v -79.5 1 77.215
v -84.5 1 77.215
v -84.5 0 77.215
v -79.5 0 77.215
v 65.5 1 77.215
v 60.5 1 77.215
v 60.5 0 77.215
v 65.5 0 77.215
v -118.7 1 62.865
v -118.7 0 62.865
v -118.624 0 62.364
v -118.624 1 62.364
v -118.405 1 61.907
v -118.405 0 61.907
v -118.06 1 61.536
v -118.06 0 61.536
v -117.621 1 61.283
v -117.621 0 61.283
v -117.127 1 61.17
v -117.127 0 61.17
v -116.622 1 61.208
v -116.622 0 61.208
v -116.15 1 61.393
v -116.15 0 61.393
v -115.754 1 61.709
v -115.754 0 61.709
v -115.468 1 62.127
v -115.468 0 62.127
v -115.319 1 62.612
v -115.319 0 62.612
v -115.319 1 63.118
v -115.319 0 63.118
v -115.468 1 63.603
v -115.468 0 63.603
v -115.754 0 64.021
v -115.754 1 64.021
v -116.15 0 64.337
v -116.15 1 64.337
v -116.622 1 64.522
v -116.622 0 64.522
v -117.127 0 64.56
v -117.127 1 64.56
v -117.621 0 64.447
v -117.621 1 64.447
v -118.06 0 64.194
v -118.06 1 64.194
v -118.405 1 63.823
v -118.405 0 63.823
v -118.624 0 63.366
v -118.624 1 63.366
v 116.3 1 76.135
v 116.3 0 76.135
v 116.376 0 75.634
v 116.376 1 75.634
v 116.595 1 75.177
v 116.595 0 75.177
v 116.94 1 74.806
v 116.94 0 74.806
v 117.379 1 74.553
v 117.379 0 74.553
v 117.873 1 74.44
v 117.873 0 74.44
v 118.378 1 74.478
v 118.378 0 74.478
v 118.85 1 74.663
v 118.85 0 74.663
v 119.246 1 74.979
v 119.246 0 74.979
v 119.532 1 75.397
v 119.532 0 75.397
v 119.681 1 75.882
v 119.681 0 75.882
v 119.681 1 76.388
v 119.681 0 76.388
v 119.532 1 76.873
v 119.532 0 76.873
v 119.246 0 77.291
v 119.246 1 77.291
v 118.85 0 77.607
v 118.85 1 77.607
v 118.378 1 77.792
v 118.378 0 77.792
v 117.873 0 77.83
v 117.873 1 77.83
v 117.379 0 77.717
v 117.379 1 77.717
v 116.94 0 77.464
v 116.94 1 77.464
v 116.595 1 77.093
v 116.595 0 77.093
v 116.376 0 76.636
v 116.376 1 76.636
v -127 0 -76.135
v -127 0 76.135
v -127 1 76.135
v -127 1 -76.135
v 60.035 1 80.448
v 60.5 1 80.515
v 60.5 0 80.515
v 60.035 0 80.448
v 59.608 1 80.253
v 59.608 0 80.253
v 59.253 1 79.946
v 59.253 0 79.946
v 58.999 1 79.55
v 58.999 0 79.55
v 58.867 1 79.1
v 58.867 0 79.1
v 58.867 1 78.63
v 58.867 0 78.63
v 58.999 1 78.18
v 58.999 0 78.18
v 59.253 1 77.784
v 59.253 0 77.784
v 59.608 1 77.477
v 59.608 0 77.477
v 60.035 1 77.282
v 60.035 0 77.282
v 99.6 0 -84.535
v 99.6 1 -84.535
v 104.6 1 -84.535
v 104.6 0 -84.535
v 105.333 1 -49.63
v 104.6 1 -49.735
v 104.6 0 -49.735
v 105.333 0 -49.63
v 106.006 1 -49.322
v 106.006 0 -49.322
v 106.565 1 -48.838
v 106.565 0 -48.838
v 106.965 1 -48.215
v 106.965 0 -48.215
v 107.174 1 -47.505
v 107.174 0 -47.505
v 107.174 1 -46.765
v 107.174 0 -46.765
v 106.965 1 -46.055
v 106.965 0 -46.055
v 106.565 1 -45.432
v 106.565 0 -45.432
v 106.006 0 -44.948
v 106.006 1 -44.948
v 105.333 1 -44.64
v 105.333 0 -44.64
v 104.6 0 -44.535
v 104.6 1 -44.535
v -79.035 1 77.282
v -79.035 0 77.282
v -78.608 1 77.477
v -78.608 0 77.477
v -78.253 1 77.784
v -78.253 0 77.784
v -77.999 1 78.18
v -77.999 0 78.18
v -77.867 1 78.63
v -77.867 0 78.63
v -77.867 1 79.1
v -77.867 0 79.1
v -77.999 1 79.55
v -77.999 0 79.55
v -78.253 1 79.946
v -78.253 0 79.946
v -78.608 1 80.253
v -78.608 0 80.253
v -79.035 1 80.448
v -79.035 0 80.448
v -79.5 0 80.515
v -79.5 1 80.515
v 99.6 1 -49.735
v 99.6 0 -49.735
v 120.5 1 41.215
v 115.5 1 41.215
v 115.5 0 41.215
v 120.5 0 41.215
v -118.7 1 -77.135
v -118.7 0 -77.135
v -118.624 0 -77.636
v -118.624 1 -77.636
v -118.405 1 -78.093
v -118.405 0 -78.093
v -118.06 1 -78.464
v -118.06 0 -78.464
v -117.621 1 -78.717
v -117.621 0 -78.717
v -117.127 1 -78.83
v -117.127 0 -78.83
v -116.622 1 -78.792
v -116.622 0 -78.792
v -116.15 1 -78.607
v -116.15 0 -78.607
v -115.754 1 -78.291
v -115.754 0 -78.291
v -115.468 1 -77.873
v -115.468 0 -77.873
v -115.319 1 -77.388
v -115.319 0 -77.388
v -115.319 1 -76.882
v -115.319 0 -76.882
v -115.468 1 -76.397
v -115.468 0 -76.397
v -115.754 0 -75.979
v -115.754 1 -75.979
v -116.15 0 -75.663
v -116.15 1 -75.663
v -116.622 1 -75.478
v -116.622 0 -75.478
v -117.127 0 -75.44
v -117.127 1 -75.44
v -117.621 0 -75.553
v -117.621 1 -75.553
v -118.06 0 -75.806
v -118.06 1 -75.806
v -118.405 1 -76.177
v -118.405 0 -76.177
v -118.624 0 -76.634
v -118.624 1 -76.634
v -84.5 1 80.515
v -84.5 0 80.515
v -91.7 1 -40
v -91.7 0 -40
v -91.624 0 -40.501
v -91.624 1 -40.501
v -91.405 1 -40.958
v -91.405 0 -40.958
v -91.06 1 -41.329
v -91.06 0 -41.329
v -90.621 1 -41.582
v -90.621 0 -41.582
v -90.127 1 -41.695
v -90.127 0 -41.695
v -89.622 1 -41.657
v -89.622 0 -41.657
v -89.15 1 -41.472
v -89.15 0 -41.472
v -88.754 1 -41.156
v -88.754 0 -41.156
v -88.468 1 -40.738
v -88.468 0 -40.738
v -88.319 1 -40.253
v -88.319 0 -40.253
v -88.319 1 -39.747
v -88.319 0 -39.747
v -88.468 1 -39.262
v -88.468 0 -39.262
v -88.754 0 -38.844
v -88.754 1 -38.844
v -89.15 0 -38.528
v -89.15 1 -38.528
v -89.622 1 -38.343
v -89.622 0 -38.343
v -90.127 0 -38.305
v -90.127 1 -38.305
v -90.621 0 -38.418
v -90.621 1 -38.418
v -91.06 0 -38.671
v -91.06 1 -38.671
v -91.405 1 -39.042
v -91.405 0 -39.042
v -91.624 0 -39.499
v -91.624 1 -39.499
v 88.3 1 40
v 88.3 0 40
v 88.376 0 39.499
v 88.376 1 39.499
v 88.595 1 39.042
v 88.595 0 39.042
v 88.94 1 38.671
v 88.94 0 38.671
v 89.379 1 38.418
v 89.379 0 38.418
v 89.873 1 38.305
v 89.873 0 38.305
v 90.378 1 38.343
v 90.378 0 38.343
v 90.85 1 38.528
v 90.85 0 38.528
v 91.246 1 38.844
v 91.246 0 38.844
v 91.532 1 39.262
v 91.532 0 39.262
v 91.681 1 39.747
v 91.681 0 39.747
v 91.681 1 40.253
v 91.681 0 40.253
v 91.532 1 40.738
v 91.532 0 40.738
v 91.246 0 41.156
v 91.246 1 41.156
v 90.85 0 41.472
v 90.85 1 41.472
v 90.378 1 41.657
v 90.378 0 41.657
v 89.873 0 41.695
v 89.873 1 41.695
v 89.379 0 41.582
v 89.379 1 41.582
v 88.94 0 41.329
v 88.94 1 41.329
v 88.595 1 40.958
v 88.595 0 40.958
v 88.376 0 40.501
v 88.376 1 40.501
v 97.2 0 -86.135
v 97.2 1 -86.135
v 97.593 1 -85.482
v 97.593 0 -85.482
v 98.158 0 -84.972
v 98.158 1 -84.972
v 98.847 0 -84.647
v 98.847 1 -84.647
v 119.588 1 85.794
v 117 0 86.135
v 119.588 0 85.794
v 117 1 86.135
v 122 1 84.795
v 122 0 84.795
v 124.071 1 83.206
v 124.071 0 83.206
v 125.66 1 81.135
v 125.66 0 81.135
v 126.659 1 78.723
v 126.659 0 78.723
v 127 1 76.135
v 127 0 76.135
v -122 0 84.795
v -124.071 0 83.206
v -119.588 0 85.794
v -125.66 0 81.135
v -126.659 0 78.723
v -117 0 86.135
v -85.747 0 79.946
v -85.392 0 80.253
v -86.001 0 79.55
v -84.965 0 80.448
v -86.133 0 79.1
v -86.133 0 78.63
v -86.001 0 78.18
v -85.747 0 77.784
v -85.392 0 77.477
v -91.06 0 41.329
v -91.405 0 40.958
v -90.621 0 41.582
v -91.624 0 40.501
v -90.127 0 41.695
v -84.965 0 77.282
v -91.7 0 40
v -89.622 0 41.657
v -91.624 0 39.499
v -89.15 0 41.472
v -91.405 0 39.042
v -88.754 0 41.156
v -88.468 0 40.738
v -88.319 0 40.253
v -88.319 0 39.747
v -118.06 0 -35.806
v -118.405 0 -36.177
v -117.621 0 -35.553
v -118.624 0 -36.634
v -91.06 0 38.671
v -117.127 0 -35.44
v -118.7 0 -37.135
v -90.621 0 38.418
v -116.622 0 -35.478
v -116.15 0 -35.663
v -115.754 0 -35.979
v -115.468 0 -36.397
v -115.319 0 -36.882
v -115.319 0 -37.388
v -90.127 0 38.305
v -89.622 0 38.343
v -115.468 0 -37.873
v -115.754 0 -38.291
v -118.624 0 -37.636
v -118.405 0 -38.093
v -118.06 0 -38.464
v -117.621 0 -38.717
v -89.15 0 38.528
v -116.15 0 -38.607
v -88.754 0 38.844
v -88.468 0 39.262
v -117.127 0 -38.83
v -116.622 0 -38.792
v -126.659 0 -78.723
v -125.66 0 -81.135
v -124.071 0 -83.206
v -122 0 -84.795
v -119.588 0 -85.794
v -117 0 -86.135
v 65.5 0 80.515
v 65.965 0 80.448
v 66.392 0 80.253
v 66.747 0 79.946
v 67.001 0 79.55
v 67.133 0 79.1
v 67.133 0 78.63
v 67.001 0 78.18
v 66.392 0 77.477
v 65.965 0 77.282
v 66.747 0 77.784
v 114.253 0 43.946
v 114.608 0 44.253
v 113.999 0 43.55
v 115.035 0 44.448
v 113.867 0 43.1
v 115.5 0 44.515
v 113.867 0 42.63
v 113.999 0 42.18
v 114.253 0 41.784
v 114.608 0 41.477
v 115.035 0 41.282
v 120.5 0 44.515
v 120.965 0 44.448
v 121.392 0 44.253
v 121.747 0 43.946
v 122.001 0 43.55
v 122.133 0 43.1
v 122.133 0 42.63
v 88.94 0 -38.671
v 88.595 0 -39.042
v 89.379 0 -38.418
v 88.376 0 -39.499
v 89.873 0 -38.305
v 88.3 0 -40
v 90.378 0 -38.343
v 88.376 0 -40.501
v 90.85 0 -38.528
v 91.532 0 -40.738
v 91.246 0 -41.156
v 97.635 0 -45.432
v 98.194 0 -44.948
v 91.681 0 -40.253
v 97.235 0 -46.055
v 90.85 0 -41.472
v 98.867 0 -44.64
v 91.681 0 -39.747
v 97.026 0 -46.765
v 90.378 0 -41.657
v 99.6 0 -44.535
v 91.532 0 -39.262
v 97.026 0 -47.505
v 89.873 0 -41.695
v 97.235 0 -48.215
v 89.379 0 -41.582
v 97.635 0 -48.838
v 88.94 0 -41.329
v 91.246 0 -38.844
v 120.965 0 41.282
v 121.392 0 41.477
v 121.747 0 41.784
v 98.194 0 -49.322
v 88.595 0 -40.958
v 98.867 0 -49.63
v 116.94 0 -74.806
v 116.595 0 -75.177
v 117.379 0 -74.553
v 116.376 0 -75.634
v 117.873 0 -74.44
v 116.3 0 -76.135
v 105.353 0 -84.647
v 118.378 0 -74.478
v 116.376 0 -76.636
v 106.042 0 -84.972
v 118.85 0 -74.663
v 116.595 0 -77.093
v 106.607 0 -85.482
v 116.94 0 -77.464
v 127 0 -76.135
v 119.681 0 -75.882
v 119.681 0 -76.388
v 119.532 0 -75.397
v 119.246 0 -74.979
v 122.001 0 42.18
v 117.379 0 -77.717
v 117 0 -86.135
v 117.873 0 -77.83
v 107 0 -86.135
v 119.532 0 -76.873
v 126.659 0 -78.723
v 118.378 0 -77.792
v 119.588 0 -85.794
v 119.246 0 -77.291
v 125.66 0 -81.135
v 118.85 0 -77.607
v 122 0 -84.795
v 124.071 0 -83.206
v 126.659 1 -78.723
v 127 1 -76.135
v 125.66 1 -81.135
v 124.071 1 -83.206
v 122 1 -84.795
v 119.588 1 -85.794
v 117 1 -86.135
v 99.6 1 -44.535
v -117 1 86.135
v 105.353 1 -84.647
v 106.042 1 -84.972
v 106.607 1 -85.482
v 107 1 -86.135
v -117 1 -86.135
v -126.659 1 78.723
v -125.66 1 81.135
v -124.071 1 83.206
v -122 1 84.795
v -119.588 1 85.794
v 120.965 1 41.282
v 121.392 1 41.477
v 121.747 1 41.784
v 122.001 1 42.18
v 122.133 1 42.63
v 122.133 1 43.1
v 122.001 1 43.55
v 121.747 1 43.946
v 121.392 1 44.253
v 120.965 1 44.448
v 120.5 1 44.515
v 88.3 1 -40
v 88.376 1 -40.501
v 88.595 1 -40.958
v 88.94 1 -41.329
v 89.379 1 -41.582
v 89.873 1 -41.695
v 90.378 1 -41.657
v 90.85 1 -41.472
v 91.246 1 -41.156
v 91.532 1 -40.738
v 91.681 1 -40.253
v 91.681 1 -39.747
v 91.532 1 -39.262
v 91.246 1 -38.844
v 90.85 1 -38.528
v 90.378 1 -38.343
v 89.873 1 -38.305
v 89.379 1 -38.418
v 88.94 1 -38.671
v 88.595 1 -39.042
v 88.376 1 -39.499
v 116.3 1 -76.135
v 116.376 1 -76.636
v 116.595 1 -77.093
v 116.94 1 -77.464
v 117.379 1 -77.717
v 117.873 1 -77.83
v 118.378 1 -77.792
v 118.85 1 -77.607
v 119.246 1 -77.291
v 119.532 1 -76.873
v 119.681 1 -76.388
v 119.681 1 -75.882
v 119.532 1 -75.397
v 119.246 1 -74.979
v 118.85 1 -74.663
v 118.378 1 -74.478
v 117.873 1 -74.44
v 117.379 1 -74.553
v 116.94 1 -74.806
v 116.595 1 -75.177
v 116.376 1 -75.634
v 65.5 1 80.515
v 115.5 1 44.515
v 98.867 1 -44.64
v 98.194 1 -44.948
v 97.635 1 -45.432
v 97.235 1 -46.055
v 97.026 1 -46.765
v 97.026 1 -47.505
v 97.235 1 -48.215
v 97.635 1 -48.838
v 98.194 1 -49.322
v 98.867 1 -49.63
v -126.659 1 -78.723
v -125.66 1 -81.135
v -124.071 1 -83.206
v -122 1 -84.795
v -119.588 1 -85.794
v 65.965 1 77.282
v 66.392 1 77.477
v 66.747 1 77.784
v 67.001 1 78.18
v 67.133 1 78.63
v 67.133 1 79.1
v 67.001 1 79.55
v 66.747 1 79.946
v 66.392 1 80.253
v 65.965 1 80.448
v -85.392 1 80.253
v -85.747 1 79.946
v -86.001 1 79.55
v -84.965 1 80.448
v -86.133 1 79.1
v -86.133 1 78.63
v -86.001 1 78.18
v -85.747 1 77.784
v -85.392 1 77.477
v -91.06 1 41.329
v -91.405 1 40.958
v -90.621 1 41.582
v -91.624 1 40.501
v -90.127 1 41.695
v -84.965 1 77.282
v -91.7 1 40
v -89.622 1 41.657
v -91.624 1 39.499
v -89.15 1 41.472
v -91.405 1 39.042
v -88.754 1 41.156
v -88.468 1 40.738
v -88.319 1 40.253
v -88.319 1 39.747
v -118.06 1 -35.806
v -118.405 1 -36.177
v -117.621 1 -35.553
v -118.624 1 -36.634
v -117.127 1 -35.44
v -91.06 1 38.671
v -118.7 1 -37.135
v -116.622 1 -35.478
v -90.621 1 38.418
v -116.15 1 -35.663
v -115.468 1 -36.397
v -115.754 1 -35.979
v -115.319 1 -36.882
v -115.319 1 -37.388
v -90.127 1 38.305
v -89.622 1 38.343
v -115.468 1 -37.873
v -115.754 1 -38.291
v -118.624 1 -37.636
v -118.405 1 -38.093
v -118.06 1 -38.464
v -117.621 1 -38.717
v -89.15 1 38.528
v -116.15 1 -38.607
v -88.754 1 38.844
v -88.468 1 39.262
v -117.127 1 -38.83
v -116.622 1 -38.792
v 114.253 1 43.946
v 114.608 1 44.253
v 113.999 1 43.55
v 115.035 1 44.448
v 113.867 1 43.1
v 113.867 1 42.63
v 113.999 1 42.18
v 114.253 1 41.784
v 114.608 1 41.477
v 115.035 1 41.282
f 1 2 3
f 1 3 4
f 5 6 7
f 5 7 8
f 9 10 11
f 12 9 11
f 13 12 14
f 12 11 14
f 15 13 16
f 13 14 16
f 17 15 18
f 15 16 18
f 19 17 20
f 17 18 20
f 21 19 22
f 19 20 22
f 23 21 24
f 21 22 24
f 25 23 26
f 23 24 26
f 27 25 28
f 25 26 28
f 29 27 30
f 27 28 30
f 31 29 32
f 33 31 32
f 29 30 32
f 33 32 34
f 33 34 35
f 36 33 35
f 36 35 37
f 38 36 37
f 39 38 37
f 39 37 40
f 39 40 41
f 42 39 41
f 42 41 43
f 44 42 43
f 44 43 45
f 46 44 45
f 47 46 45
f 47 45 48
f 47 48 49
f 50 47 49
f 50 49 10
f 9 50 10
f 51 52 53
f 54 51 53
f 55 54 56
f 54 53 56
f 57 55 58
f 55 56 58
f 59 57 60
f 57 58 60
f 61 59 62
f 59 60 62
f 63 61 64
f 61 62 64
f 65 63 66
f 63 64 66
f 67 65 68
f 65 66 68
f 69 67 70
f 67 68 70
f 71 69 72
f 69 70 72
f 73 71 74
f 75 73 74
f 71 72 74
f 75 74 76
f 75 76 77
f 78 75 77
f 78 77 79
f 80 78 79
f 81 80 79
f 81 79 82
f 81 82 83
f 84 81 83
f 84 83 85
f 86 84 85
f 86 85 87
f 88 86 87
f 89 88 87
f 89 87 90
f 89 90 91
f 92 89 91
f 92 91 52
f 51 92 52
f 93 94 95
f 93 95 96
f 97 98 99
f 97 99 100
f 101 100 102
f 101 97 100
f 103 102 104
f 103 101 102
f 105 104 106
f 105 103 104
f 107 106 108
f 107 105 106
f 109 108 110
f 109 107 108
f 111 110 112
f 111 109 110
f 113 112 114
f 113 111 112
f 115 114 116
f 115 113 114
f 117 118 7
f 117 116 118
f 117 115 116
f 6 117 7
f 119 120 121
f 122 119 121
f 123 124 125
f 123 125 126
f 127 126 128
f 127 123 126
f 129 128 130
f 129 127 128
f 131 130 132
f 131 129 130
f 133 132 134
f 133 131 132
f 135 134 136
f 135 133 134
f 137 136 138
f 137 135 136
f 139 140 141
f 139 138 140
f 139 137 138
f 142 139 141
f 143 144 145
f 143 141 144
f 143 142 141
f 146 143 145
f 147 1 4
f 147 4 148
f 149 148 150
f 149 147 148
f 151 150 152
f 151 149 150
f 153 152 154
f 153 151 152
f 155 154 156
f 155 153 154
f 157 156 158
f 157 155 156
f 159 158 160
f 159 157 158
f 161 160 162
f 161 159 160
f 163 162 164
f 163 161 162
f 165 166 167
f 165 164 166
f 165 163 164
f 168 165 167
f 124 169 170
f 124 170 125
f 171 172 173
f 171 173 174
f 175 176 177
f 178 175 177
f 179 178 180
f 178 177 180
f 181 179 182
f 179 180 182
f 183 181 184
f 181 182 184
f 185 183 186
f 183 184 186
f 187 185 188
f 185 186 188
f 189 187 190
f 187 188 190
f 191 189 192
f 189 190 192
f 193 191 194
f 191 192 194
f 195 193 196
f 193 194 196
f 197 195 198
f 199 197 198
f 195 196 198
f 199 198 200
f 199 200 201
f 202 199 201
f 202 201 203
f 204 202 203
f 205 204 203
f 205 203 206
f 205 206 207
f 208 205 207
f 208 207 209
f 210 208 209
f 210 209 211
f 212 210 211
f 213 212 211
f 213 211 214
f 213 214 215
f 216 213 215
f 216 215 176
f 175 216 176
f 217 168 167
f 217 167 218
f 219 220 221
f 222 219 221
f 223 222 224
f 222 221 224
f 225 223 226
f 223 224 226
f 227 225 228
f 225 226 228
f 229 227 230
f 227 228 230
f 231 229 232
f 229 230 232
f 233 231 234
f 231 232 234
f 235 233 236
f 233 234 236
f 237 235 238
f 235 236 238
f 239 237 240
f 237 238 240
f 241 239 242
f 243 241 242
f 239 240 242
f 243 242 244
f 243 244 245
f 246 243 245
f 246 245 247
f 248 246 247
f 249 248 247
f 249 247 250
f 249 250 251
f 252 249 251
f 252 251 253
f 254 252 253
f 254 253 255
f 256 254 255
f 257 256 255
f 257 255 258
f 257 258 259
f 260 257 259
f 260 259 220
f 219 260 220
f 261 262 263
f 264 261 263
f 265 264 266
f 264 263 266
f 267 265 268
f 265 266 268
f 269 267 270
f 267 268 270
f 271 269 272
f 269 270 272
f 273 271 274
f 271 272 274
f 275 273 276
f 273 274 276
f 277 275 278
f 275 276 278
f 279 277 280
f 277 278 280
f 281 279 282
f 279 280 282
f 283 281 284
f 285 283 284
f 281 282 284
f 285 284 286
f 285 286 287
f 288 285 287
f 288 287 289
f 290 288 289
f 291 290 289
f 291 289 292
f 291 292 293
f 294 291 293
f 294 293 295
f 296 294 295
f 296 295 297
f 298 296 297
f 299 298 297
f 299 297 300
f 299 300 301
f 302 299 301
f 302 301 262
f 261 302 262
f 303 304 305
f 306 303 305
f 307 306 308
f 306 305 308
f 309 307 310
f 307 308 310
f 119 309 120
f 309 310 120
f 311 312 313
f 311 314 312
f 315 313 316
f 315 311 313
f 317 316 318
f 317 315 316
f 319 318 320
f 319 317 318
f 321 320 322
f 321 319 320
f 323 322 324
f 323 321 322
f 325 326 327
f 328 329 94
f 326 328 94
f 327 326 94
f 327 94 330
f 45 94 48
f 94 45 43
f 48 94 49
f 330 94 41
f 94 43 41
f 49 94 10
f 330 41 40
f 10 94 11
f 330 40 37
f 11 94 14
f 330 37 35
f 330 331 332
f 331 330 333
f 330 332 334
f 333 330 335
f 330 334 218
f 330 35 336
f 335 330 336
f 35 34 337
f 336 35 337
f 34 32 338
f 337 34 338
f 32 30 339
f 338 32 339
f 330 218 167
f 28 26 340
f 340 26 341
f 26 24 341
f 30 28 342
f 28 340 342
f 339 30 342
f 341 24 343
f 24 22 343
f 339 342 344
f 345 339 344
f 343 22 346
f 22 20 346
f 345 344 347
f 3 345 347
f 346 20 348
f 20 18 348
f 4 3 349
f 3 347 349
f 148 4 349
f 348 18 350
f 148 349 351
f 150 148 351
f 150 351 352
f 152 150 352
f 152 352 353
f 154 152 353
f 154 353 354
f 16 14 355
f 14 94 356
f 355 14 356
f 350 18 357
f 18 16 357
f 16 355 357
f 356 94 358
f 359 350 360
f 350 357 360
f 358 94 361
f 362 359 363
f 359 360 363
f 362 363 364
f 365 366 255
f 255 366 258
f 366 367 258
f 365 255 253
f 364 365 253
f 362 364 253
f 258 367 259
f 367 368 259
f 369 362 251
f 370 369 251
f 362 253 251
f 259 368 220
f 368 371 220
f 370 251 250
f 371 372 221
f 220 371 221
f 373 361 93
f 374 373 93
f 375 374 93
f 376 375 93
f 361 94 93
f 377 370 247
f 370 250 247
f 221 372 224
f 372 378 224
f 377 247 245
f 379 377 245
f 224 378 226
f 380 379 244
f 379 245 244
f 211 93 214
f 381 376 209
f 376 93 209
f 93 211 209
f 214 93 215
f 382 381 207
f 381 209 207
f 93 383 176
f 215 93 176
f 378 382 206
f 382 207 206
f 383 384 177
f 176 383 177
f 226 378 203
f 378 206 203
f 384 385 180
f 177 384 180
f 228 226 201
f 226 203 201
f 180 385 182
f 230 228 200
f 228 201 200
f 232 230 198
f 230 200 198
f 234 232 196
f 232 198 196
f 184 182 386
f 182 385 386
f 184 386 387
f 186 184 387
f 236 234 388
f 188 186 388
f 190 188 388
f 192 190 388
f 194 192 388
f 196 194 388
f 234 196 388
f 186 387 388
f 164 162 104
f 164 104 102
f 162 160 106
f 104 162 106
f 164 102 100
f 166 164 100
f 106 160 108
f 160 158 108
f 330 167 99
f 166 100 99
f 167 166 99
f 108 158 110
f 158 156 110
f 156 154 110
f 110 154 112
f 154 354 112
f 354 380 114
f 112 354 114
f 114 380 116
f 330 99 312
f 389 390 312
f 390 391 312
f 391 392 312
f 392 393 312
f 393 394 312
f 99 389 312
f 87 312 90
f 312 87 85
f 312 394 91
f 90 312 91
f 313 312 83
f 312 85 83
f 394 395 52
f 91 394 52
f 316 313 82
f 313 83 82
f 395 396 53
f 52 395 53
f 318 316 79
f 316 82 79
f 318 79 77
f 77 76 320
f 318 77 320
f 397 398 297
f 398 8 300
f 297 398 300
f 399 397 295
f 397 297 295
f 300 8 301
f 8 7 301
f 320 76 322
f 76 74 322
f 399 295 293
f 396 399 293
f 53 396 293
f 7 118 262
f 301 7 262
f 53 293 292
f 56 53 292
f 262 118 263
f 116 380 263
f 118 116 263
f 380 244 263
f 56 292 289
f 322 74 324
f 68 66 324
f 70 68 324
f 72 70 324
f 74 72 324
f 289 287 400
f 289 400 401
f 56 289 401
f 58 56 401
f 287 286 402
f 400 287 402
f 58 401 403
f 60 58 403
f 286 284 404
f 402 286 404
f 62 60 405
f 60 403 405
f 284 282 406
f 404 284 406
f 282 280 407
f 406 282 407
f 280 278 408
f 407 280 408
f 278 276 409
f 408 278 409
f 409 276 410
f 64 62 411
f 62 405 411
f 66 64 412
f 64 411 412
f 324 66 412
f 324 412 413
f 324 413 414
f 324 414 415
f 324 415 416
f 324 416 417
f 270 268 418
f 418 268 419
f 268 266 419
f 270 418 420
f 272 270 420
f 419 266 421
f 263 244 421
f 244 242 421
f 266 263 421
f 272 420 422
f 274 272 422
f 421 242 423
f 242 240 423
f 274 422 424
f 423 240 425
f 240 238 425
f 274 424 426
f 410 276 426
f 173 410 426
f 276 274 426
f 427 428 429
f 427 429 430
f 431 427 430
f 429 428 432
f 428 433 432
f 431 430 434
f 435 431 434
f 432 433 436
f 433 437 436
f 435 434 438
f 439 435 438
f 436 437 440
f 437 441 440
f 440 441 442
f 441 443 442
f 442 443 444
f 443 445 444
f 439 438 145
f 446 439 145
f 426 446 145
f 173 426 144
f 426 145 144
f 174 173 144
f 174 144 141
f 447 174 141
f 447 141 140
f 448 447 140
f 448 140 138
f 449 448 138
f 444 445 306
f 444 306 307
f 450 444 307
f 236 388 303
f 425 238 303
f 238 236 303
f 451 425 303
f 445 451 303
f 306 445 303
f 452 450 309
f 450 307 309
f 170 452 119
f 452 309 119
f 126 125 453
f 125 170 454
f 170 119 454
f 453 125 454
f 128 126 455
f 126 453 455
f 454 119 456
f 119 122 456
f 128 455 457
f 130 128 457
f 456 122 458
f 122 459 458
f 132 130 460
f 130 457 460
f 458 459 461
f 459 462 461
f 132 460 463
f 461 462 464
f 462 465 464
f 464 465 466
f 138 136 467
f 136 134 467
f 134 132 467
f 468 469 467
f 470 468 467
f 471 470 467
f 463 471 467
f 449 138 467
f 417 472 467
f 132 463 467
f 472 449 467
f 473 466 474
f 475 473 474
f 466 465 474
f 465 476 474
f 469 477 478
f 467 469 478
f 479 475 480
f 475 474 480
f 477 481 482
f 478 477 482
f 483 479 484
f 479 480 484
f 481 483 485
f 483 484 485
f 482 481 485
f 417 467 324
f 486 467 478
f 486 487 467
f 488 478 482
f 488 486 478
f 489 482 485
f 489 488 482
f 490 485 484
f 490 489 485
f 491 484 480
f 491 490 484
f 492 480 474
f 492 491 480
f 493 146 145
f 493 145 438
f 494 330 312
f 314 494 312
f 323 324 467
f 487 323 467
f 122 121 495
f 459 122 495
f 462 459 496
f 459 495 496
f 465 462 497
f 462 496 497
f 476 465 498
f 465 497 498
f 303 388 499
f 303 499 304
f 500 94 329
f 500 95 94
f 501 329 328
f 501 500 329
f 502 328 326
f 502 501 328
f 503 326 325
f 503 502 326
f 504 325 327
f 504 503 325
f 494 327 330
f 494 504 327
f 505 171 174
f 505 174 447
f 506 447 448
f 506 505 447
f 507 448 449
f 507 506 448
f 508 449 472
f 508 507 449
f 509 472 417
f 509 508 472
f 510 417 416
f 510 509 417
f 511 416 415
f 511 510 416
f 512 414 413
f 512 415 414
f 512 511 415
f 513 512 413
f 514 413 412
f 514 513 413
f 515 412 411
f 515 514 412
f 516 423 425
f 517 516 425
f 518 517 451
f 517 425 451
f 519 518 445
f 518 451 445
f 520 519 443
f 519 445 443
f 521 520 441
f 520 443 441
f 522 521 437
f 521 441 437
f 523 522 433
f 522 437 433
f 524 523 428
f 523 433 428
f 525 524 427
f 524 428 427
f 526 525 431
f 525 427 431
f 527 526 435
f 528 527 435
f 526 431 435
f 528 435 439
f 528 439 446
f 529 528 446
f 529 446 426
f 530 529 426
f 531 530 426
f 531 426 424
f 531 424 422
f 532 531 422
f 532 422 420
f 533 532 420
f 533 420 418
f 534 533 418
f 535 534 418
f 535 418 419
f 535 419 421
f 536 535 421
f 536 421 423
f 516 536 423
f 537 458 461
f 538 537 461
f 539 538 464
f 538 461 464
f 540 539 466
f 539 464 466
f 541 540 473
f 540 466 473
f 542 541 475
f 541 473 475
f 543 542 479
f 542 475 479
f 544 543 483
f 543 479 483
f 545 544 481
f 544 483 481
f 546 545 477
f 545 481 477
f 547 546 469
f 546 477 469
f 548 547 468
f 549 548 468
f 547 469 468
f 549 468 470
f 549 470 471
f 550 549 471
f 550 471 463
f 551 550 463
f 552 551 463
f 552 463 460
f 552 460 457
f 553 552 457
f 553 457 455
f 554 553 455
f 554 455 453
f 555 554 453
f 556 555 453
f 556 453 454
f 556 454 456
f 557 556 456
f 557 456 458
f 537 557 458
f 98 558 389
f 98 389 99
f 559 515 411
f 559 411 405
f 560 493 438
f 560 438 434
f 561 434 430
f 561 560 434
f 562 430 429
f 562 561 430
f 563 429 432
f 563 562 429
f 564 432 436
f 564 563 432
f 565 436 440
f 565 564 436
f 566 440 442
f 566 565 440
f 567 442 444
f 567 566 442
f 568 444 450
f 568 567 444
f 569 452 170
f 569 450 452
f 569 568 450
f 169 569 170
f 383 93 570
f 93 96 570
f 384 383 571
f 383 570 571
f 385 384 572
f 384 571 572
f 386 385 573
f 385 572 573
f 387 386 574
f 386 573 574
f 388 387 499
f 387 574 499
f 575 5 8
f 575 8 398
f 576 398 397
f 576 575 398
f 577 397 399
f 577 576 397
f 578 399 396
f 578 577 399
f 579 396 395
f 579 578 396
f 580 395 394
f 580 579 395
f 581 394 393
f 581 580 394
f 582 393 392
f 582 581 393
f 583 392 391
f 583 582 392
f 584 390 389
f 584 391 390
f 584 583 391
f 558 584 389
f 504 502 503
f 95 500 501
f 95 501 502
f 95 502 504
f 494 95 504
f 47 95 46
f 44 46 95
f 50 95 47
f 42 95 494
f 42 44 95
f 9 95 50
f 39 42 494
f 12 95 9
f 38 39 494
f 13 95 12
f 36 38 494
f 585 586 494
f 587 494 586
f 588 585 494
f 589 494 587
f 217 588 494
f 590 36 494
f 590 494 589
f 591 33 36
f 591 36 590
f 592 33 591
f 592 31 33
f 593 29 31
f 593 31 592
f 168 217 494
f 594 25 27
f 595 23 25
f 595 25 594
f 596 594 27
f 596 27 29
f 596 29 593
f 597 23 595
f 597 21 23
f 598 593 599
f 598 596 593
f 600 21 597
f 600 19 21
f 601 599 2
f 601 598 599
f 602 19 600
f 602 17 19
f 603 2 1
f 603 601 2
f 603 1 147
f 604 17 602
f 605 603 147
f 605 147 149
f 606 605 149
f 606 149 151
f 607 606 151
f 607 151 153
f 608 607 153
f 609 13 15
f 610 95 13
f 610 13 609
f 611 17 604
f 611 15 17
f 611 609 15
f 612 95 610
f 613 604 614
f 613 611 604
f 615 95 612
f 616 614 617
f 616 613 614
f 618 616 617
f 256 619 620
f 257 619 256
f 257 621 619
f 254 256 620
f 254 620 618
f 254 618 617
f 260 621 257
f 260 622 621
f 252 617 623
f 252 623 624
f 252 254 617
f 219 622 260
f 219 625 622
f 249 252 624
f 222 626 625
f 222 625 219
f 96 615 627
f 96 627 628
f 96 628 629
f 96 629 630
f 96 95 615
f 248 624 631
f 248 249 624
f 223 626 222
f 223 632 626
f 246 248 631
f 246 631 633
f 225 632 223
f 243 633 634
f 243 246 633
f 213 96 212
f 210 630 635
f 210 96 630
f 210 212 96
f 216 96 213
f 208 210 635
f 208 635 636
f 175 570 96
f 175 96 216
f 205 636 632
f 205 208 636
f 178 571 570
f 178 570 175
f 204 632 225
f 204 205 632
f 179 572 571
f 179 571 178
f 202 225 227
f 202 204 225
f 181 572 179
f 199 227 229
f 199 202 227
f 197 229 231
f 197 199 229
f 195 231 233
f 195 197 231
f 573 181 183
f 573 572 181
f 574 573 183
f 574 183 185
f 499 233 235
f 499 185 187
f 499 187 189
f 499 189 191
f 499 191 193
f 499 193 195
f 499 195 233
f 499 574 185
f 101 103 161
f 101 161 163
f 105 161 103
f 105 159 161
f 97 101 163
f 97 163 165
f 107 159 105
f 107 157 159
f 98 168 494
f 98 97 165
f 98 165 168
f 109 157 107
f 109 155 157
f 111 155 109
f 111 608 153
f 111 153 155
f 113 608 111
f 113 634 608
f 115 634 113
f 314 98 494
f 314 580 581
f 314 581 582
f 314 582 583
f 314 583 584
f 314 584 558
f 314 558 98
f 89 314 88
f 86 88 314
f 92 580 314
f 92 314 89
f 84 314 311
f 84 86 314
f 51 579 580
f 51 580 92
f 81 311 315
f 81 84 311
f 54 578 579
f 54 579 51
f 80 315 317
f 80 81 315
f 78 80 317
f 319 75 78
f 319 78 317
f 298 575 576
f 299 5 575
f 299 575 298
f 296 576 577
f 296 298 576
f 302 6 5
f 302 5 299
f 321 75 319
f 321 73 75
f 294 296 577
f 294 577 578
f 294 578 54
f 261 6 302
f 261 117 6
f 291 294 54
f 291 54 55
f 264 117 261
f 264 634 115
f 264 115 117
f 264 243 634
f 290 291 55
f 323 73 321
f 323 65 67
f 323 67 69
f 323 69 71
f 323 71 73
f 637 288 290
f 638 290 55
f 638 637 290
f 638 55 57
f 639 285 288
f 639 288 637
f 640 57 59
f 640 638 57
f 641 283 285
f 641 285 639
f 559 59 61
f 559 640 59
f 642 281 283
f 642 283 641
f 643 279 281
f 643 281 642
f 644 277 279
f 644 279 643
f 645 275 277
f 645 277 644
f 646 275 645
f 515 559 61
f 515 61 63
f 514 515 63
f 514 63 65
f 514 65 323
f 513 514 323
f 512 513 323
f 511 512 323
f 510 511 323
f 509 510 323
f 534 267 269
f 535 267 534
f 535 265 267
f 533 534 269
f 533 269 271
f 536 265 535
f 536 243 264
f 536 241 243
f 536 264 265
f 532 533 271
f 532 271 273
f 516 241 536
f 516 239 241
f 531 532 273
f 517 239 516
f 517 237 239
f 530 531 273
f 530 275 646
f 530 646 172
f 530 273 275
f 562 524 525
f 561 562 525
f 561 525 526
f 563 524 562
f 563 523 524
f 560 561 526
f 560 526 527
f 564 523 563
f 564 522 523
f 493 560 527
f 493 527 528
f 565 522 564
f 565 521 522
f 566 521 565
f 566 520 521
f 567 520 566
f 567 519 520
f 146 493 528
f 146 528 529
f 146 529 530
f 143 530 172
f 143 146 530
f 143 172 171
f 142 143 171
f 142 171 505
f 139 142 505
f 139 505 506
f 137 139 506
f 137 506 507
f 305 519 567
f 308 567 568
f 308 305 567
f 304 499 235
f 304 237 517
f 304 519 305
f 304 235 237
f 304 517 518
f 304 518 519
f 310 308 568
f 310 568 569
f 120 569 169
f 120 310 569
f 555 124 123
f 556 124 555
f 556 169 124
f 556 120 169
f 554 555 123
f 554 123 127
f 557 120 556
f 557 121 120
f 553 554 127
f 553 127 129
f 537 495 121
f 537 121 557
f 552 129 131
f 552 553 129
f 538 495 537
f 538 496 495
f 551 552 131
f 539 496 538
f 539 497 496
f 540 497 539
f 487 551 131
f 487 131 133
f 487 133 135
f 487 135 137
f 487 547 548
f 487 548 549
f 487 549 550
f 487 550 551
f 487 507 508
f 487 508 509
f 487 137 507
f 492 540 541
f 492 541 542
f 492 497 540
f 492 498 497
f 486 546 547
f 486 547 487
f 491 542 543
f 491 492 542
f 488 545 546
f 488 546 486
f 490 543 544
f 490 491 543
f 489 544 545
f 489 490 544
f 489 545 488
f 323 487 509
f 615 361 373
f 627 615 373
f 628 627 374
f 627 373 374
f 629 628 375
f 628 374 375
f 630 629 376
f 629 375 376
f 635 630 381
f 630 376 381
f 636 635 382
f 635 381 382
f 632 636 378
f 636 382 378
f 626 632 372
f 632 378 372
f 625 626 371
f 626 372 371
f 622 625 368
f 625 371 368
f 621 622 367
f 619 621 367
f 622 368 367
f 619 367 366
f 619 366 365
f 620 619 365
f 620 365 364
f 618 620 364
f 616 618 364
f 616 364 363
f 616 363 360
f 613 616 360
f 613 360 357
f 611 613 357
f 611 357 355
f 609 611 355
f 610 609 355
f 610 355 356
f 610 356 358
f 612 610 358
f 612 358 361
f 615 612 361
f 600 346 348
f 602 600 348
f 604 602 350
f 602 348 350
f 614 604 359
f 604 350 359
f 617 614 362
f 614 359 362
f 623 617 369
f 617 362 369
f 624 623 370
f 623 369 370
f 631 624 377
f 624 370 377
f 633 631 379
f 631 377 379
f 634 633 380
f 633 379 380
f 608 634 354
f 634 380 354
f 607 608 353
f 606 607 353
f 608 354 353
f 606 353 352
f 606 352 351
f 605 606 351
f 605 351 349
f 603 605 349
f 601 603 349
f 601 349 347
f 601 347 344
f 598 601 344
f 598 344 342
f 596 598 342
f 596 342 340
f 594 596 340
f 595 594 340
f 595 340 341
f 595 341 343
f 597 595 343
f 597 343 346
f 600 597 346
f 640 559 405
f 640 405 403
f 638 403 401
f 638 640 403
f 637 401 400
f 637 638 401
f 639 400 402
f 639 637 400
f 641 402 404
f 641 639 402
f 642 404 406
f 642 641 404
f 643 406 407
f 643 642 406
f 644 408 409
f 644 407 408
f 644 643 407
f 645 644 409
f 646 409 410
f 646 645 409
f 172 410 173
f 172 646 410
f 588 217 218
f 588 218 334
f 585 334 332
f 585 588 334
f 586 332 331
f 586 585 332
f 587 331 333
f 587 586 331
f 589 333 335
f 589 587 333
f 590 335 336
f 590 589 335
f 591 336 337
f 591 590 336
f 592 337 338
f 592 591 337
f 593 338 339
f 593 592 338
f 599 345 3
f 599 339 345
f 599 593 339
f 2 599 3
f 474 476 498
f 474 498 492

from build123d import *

# Parameters (mm, degrees)
SKETCH1_W            = 254
SKETCH1_H            = 172.27
BOSS_EXTRUDE1_DEPTH  = 1
FILLET1_R            = 10
M3_CLEARANCE_HOLE1_D = 3.4
CUT_EXTRUDE2_DEPTH   = 154.457610515


with BuildPart() as part:
    # Sketch1 → Boss-Extrude1 (new body)
    with BuildSketch(Plane(origin=(0, 0, 0), x_dir=(1, 0, 0), z_dir=(0, 1, 0))):
        Rectangle(SKETCH1_W, SKETCH1_H)
    extrude(amount=BOSS_EXTRUDE1_DEPTH)

    # Fillet1
    fillet1_edges = [part.edges().sort_by_distance(p)[0] for p in [
        (127, 0.5, 86.135),
        (-127, 0.5, 86.135),
        (-127, 0.5, -86.135),
        (127, 0.5, -86.135),
    ]]
    fillet(fillet1_edges, radius=FILLET1_R)

    # M3 Clearance Hole1 (through all)
    with Locations(Plane(origin=(0, 1, 0), x_dir=(1, 0, 0), z_dir=(0, 1, 0))):
        with Locations((-117, 77.135), (-117, -62.865), (118, -76.135), (118, 76.135), (-90, -40), (90, -40), (-90, 40), (90, 40), (-117, 37.135)):
            Hole(M3_CLEARANCE_HOLE1_D / 2)

    # Sketch6 → Cut-Extrude2 (cut, through all)
    with BuildSketch(Plane(origin=(0, 1, 0), x_dir=(1, 0, 0), z_dir=(0, 1, 0))):
        with BuildLine():
            Line((-79.5, -80.515), (-84.5, -80.515))
            ThreePointArc((-84.5, -80.515), (-86.15, -78.865), (-84.5, -77.215))
            Line((-84.5, -77.215), (-79.5, -77.215))
            ThreePointArc((-79.5, -77.215), (-77.85, -78.865), (-79.5, -80.515))
        make_face()
        with BuildLine():
            Line((120.5, -44.515), (115.5, -44.515))
            ThreePointArc((115.5, -44.515), (113.85, -42.865), (115.5, -41.215))
            Line((115.5, -41.215), (120.5, -41.215))
            ThreePointArc((120.5, -41.215), (122.15, -42.865), (120.5, -44.515))
        make_face()
        with BuildLine():
            Line((65.5, -80.515), (60.5, -80.515))
            ThreePointArc((60.5, -80.515), (58.85, -78.865), (60.5, -77.215))
            Line((60.5, -77.215), (65.5, -77.215))
            ThreePointArc((65.5, -77.215), (67.15, -78.865), (65.5, -80.515))
        make_face()
        with BuildLine():
            Line((104.6, 44.535), (99.6, 44.535))
            ThreePointArc((99.6, 44.535), (97, 47.135), (99.6, 49.735))
            Line((99.6, 49.735), (104.6, 49.735))
            ThreePointArc((104.6, 49.735), (107.2, 47.135), (104.6, 44.535))
        make_face()
        with BuildLine():
            Line((107, 86.135), (97.2, 86.135))
            ThreePointArc((97.2, 86.135), (98.15777949, 84.971669235), (99.6, 84.535))
            Line((99.6, 84.535), (104.6, 84.535))
            ThreePointArc((104.6, 84.535), (106.04222051, 84.971669235), (107, 86.135))
        make_face()
    extrude(amount=-CUT_EXTRUDE2_DEPTH, mode=Mode.SUBTRACT)


solid = part.part
